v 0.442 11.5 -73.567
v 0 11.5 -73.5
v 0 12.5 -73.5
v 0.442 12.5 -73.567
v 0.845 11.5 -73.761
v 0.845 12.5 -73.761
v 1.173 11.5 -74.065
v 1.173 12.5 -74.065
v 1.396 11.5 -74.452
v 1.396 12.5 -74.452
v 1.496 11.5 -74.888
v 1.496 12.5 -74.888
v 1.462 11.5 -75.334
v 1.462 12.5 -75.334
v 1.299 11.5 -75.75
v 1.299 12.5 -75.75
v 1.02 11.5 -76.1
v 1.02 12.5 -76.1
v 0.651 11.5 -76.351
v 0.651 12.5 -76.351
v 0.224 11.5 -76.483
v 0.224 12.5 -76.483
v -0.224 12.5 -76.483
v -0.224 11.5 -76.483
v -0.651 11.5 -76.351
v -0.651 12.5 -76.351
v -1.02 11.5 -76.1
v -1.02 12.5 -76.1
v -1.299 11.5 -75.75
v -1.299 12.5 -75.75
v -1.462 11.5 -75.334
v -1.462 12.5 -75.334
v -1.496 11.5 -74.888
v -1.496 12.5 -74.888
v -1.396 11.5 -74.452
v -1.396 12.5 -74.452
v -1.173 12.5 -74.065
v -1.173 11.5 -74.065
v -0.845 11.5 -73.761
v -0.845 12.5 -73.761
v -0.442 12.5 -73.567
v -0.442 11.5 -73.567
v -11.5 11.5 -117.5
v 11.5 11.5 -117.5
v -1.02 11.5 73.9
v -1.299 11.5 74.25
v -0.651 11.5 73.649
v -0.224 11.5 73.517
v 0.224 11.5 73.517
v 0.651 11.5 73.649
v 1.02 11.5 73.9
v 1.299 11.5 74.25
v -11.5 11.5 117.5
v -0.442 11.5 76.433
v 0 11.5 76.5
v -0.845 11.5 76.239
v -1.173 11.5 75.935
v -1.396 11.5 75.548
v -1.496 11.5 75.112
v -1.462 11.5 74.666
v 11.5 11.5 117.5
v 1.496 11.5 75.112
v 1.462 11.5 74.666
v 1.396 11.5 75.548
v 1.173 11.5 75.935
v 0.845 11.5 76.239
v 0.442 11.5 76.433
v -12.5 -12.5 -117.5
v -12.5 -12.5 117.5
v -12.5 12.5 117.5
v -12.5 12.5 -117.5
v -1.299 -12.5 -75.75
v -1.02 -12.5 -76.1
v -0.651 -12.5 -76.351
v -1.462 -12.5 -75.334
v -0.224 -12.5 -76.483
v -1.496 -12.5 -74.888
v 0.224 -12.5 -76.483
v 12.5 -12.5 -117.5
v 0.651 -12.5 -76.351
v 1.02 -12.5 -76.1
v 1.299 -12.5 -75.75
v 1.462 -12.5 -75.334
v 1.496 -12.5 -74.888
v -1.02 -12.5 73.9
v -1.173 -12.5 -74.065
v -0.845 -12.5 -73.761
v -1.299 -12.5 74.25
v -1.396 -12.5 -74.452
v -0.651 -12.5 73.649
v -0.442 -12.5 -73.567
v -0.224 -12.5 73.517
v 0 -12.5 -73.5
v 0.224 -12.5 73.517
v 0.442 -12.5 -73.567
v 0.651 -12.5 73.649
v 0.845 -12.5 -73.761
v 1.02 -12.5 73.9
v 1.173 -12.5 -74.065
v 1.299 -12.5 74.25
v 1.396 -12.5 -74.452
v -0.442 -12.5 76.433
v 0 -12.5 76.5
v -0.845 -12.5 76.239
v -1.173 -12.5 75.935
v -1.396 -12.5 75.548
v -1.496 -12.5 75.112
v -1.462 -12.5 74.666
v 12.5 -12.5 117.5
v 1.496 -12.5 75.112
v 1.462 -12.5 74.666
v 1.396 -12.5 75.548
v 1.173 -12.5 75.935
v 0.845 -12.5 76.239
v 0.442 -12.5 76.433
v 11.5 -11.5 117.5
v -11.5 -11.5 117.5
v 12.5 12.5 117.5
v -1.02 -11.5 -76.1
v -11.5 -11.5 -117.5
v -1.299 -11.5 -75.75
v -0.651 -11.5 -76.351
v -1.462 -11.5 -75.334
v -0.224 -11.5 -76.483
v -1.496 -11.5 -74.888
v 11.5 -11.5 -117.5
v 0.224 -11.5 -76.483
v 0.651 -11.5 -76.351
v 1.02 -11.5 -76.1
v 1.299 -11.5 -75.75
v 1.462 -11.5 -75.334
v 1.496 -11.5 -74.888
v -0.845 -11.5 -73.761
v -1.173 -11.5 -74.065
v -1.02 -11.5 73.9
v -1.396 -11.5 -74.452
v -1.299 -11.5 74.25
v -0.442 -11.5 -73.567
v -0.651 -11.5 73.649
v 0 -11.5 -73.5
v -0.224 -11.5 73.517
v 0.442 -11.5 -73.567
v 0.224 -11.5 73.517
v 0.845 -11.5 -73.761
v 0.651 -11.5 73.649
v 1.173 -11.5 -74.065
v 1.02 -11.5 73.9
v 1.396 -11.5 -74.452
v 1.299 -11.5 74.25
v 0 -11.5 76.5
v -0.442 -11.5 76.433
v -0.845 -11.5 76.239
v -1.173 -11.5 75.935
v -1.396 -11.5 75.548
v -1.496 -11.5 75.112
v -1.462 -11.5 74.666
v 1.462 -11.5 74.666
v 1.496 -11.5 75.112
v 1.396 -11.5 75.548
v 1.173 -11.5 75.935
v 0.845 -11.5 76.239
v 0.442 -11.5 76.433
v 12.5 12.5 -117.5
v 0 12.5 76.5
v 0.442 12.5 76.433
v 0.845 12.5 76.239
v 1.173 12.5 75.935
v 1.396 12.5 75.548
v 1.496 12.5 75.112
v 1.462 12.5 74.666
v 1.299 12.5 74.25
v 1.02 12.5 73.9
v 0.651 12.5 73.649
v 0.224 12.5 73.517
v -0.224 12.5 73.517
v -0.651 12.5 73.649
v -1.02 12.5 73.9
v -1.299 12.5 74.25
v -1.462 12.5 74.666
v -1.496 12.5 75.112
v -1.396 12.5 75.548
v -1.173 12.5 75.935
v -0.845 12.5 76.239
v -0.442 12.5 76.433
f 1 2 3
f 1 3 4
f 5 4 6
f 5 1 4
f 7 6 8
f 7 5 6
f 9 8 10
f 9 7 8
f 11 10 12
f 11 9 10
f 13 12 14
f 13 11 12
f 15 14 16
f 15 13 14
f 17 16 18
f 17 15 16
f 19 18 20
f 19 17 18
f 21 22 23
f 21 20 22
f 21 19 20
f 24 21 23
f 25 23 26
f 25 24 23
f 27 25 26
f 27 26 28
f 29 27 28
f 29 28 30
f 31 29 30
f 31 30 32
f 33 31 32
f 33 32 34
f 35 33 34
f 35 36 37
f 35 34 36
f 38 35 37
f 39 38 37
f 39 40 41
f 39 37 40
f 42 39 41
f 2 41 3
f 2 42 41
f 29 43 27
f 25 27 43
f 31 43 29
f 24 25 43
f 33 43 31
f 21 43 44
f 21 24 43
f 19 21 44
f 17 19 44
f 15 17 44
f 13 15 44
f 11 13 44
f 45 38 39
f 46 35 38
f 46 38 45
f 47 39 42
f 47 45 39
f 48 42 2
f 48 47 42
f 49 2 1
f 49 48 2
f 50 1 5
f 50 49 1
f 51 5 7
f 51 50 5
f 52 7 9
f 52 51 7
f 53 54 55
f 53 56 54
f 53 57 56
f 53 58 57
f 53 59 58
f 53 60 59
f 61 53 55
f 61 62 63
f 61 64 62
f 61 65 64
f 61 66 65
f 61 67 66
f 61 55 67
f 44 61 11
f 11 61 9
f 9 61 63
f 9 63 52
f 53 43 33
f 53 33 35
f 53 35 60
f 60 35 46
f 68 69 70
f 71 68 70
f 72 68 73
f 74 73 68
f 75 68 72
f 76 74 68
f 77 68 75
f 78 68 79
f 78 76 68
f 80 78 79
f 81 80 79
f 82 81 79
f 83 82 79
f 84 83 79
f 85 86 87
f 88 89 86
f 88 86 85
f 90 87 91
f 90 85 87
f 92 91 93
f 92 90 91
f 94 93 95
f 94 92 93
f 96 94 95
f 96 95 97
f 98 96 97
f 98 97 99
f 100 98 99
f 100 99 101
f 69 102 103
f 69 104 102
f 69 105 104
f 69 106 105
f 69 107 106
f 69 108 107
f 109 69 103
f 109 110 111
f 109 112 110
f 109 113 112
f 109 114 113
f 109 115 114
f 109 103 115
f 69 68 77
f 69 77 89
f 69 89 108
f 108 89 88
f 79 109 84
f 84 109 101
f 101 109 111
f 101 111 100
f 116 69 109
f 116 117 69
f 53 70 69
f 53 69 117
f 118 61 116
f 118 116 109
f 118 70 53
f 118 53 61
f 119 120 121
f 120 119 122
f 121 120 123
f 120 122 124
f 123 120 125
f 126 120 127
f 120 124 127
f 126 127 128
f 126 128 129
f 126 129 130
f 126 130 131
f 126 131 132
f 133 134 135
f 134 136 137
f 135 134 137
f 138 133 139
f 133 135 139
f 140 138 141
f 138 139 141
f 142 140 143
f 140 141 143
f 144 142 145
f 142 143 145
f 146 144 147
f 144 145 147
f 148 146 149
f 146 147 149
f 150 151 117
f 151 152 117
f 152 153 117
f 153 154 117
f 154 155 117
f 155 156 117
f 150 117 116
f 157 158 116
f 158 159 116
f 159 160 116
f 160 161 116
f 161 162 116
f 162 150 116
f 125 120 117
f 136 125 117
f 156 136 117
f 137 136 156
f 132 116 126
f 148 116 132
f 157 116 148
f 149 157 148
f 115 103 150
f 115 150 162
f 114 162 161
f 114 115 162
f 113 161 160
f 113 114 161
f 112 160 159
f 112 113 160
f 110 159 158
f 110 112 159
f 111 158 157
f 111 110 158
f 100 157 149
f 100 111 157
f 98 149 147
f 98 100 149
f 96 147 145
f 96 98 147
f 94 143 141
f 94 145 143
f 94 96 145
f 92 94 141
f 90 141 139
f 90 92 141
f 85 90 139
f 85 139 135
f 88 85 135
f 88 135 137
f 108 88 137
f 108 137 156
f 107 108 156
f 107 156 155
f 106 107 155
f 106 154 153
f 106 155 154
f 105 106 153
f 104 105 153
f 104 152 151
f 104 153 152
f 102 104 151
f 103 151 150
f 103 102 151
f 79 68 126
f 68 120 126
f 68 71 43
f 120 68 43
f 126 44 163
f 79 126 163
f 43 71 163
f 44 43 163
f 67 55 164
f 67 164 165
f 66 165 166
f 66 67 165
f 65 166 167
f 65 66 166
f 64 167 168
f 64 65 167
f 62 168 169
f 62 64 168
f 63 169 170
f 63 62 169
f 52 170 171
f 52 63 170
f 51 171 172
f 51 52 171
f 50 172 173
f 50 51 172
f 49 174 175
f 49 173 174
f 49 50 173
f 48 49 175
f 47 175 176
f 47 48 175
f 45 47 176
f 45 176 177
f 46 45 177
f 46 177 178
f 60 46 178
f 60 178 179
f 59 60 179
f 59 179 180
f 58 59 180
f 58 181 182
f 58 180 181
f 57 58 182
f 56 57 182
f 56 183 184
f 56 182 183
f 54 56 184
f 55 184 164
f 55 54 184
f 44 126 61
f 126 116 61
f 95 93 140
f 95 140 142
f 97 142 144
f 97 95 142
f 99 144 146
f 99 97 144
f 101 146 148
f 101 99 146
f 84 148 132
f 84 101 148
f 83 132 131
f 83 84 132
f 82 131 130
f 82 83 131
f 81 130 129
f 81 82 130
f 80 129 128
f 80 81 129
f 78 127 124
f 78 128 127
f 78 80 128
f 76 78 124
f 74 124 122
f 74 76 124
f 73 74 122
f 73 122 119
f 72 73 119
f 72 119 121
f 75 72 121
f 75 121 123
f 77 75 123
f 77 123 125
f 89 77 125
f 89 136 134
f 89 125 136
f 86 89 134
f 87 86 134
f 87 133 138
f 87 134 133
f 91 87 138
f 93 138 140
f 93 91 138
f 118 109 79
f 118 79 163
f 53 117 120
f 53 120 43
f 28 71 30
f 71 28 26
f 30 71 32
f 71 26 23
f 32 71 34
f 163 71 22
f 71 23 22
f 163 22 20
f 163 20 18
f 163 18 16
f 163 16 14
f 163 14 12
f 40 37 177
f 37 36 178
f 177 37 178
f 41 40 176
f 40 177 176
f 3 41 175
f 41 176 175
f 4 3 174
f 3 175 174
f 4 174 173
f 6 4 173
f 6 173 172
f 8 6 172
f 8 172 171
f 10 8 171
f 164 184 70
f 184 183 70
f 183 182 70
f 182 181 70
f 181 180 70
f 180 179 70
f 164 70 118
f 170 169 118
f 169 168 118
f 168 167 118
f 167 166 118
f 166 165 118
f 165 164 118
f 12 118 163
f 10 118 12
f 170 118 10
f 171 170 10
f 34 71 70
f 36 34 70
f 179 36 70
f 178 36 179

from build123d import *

# Parameters (mm, degrees)
SKETCH1_W               = 25
SKETCH1_H               = 25
SKETCH1_W_2             = 23
SKETCH1_H_2             = 23
BOSS_EXTRUDE1_DEPTH     = 117.5
CUT_EXTRUDE1_DEPTH      = 121.778723292
CUT_EXTRUDE1_DEPTH_BACK = 121.778723292
SKETCH2_R               = 1.5


with BuildPart() as part:
    # Sketch1 → Boss-Extrude1 (new, symmetric)
    with BuildSketch(Plane.XY):
        Rectangle(SKETCH1_W, SKETCH1_H)
        Rectangle(SKETCH1_W_2, SKETCH1_H_2, mode=Mode.SUBTRACT)
    extrude(amount=BOSS_EXTRUDE1_DEPTH, both=True)

    # Sketch2 → Cut-Extrude1 (cut, two sides: drawn at the far end of the back side and taken through both)
    with BuildSketch(Plane(origin=(0, 12.5, 0), x_dir=(1, 0, 0), z_dir=(0, 1, 0)).offset(-CUT_EXTRUDE1_DEPTH_BACK)):
        with Locations(Location((0, 75, 0), (0, 0, 270))):
            Circle(SKETCH2_R)
        with Locations(Location((0, -75, 0), (0, 0, 270))):
            Circle(SKETCH2_R)
    extrude(amount=CUT_EXTRUDE1_DEPTH + CUT_EXTRUDE1_DEPTH_BACK, mode=Mode.SUBTRACT)


solid = part.part
